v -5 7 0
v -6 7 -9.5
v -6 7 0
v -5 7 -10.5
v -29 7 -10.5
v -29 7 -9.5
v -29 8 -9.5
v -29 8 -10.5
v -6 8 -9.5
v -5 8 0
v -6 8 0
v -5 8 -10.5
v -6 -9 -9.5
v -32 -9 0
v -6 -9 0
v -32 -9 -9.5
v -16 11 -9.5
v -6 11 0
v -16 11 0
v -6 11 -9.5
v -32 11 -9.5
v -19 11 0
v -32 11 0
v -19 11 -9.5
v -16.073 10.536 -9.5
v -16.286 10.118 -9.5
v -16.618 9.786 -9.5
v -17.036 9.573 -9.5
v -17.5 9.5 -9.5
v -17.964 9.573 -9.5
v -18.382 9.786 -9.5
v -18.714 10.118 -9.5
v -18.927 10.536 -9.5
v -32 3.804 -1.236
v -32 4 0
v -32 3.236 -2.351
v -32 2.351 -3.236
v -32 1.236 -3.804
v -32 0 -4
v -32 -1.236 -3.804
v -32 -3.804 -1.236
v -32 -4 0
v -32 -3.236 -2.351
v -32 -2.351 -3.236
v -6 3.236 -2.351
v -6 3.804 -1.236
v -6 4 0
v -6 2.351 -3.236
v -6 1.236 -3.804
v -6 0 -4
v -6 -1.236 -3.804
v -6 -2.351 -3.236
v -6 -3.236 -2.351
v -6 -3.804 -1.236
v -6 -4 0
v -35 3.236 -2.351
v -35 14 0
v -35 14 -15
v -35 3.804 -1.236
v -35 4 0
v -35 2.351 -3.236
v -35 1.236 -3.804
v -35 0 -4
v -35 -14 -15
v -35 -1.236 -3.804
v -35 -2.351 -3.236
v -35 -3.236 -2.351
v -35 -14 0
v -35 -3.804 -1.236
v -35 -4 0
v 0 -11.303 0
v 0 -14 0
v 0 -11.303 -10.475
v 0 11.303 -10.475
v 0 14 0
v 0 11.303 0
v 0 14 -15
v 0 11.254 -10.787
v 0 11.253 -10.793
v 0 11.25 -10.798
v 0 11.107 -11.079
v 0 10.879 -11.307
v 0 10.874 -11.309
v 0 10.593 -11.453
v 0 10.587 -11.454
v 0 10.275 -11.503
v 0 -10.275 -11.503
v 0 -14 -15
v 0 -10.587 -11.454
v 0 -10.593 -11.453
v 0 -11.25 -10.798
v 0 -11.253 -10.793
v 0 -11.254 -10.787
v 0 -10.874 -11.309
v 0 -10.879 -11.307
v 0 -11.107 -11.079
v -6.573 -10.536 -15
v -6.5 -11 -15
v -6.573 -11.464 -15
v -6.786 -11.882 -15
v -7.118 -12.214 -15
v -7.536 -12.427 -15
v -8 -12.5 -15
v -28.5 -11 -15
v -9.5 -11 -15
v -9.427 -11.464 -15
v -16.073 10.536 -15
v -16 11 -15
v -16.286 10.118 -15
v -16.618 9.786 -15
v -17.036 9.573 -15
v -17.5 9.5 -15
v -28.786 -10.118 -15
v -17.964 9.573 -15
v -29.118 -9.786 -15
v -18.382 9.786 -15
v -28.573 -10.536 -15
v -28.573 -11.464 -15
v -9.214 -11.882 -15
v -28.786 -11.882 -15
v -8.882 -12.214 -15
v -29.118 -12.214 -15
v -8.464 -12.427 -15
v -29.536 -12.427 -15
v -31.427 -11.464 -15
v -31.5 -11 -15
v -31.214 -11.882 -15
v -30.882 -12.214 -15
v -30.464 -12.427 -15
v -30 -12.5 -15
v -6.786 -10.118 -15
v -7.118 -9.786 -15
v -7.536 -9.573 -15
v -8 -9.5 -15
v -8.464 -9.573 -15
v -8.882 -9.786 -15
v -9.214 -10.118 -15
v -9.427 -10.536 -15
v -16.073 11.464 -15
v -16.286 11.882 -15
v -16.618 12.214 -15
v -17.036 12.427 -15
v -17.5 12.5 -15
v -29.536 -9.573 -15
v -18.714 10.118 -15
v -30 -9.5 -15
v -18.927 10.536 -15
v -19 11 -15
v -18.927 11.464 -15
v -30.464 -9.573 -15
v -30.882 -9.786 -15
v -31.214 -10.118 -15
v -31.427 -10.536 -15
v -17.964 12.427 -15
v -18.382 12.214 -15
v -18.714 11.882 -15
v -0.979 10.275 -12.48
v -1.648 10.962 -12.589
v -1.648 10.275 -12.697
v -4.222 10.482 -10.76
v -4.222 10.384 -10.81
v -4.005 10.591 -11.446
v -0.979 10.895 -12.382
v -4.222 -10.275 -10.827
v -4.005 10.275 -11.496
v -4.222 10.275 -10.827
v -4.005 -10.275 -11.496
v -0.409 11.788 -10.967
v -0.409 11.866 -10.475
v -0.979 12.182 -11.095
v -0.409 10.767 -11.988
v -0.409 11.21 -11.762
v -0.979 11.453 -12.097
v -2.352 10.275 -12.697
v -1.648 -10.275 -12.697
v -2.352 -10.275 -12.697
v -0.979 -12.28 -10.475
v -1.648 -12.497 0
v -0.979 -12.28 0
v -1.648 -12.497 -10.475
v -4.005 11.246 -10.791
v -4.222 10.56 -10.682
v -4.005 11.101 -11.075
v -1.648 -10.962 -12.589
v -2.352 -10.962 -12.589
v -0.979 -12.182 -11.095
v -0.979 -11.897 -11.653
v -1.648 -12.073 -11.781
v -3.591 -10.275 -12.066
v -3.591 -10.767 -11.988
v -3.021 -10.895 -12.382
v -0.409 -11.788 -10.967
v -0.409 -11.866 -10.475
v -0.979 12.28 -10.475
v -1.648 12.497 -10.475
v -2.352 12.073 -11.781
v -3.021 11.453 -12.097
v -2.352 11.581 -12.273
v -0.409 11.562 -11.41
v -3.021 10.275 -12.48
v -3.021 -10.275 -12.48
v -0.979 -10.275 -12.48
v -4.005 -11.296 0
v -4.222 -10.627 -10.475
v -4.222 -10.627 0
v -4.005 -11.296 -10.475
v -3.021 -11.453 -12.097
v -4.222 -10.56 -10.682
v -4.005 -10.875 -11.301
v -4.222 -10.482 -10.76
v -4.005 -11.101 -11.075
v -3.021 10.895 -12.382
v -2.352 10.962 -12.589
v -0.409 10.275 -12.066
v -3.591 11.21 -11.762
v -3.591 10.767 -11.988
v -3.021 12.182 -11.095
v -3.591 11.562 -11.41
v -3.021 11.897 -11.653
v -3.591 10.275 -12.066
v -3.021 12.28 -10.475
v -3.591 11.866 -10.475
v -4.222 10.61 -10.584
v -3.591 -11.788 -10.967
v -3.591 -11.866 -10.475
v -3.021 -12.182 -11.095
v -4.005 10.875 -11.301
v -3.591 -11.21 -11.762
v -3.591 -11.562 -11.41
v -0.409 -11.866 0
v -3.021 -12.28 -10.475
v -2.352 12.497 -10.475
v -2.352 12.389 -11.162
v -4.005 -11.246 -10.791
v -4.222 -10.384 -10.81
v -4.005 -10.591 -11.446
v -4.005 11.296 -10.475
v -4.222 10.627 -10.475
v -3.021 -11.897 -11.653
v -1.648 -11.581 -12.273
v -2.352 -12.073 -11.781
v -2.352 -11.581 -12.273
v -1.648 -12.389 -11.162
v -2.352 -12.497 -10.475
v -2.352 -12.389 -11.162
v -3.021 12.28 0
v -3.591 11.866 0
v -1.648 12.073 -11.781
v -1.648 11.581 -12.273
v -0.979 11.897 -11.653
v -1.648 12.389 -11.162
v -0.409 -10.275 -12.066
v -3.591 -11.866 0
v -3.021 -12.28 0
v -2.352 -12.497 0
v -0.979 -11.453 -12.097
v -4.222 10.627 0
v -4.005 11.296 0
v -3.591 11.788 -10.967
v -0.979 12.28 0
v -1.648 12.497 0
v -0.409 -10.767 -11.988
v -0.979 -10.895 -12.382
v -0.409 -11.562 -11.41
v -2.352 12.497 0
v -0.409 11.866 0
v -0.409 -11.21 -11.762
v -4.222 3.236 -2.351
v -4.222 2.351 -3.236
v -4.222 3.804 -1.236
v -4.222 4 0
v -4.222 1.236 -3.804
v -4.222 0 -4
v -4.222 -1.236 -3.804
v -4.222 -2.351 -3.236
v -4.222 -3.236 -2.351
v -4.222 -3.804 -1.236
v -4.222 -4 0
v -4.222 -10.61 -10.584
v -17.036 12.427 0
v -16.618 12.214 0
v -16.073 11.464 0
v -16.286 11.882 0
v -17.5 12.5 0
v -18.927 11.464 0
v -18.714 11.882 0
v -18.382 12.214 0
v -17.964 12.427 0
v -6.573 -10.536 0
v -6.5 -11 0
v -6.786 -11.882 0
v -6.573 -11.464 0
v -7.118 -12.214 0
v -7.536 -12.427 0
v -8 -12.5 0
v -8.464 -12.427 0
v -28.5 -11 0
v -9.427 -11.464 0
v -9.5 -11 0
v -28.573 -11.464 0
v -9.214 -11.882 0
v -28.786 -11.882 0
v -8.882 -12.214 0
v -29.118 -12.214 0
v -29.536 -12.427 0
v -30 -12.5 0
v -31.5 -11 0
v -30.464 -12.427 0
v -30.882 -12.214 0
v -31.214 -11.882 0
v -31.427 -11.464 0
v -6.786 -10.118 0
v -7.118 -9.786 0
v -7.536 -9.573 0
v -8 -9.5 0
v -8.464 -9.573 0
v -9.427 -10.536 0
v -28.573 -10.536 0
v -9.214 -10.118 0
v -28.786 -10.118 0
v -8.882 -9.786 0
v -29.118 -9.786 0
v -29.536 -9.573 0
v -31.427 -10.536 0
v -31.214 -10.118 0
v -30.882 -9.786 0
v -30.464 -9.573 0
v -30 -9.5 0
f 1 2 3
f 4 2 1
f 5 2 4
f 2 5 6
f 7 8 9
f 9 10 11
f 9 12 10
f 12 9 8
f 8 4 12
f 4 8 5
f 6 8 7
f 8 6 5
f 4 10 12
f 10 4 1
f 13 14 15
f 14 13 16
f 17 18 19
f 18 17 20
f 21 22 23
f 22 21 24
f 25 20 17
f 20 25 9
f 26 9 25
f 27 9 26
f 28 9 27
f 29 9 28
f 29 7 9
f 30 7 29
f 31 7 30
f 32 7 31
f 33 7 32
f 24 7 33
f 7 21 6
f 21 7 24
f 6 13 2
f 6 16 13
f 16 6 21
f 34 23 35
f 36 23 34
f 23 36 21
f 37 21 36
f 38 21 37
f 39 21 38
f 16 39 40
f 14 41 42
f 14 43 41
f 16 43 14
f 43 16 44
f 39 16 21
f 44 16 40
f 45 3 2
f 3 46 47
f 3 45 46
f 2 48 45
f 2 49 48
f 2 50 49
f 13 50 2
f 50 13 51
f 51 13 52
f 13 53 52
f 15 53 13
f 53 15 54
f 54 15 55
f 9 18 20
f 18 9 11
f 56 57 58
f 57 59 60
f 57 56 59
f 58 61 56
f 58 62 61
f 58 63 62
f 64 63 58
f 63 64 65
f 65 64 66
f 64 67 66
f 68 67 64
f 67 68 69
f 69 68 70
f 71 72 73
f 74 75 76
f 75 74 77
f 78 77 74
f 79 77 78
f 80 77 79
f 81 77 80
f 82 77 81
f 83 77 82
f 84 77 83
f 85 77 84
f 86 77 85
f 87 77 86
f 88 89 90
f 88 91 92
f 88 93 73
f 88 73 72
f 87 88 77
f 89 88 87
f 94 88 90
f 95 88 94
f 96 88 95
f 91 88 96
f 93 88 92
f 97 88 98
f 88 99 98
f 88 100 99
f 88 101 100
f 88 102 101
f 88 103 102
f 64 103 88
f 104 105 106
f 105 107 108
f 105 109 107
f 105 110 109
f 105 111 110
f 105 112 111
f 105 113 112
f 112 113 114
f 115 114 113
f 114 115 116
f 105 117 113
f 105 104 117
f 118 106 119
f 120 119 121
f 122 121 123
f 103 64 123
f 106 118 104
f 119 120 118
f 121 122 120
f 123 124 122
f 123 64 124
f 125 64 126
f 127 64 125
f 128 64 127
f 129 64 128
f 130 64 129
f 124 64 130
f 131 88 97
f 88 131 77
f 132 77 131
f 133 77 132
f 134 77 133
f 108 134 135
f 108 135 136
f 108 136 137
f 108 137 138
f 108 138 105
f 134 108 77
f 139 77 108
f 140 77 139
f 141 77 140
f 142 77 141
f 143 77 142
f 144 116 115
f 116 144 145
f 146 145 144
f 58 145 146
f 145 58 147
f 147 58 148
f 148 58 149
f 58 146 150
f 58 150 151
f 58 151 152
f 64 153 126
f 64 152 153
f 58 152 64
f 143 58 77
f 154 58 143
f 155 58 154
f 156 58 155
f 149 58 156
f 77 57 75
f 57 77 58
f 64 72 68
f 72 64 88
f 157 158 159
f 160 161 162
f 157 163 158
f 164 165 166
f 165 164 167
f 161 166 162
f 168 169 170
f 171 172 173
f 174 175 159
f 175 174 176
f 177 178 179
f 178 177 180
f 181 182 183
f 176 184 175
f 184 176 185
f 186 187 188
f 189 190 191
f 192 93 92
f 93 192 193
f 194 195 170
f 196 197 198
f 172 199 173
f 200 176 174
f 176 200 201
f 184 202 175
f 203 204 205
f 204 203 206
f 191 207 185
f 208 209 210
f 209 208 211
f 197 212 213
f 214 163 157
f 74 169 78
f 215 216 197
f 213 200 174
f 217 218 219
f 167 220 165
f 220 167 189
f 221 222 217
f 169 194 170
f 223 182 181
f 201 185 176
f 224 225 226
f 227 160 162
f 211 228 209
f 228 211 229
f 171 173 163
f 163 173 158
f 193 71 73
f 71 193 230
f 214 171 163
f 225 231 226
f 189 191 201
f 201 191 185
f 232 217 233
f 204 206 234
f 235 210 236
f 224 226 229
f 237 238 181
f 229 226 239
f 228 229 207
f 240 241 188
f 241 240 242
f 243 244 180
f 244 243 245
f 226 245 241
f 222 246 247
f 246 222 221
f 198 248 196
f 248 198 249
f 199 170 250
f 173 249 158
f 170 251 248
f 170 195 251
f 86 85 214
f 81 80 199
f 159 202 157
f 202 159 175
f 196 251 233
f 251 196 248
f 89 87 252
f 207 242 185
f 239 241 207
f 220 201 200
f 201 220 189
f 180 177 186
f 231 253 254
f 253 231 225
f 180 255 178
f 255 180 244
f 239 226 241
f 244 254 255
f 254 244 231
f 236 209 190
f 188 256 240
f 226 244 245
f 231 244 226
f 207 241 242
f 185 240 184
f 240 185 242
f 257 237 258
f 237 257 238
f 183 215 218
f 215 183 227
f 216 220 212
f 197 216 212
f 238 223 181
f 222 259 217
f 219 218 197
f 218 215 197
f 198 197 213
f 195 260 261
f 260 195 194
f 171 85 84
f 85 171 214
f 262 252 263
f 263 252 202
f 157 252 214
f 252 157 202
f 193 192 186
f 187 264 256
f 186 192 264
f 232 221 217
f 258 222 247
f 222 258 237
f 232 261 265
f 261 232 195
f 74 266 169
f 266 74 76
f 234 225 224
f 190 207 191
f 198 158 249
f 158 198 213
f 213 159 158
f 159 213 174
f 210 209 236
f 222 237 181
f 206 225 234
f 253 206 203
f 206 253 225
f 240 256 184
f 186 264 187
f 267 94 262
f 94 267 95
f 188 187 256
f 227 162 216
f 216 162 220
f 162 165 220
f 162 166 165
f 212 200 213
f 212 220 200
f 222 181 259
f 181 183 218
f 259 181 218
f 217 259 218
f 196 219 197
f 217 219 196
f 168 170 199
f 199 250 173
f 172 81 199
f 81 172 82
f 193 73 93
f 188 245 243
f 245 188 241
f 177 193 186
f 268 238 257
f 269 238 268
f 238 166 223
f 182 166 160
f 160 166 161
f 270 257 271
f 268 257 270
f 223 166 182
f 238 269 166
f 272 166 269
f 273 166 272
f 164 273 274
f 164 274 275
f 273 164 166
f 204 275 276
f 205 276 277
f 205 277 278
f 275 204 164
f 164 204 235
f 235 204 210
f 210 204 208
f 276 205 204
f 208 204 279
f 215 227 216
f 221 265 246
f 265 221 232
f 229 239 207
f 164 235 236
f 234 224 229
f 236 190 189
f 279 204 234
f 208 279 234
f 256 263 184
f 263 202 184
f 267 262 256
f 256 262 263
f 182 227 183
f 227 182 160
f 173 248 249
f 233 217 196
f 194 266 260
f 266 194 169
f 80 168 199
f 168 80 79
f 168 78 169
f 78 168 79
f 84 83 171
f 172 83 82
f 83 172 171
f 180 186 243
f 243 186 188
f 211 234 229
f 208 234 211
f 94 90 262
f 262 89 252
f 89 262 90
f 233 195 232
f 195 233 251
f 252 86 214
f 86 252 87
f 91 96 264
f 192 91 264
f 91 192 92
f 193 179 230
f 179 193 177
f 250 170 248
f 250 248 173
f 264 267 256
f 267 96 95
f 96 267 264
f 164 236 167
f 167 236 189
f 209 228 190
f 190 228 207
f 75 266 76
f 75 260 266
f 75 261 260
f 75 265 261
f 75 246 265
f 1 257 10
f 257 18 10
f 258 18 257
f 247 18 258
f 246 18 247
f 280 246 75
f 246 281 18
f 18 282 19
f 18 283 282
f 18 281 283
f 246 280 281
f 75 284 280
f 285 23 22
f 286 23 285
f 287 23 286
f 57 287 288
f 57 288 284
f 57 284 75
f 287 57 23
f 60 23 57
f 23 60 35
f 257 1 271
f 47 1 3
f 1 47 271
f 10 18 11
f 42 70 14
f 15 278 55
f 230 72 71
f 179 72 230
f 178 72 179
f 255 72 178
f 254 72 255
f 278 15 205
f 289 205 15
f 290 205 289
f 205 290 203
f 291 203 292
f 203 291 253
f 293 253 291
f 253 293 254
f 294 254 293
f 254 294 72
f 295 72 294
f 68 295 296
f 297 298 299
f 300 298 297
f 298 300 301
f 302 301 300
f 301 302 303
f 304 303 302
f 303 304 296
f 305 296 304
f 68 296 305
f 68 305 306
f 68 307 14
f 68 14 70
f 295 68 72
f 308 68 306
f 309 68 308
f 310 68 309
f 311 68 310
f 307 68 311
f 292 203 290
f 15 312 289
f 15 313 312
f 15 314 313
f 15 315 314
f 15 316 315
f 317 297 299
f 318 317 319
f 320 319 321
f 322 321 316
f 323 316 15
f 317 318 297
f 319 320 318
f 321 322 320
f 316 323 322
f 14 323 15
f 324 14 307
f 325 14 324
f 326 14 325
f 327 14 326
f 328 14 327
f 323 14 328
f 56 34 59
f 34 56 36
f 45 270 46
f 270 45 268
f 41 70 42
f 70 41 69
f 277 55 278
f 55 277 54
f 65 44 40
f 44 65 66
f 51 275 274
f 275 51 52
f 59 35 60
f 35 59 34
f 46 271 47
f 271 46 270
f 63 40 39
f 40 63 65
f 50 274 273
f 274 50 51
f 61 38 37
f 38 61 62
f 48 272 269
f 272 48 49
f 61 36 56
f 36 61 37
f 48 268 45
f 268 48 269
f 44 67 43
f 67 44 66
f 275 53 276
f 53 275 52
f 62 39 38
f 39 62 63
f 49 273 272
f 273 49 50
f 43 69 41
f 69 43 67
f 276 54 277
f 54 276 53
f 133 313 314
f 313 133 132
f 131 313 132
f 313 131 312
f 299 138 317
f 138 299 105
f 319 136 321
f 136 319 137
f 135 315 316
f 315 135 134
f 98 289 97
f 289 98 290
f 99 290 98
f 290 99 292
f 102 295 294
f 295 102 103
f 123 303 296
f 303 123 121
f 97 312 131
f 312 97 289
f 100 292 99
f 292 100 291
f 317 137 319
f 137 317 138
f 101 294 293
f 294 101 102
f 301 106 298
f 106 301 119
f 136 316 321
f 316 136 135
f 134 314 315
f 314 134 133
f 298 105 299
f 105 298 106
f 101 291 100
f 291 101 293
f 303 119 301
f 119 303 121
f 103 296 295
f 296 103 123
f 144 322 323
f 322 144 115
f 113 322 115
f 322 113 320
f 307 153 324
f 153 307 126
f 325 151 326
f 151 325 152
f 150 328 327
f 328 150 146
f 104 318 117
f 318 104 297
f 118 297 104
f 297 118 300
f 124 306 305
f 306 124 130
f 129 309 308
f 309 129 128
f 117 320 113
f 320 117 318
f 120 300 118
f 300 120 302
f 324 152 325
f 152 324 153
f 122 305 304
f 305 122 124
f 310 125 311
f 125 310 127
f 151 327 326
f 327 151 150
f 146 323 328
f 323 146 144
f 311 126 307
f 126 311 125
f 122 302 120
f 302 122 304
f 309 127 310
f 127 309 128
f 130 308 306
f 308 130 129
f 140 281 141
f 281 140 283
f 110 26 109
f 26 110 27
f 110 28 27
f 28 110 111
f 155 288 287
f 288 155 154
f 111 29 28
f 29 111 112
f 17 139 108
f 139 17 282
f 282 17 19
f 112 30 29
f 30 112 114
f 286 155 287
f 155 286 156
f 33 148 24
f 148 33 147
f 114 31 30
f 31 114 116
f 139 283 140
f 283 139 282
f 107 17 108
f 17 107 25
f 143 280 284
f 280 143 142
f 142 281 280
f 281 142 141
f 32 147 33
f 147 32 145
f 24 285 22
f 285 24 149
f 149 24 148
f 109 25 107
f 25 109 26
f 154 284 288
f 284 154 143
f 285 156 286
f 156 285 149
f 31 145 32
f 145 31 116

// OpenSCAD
$fn=20;
module connectorPlate(){
    
    radius = 2.25;
    offset_x = (23.2-radius)/2; 
    offset_y = (22.8-radius) /2; 
    hull() for(i = [-1,1]) for (j=[-1,1]) {
        translate([i*offset_x,j*offset_y,2]) sphere(r=2.25);
    }
}
module circuitPlate(){
    translate([-10.5,0,0]) cube([21,24,1]);
    translate([-9.5,1,-3]) cube([19,26,20]);
    
    }
    
rotate([0,-90,0]) difference() {
    translate([-15,-14,0]) cube([30,28,35]);
    hull(){    
        connectorPlate();
    }
    translate([0,8,5]) rotate([90,0,0]) circuitPlate();
    translate([0,-50,-1]) cube([100,100,100]);
    cylinder(r=4,h=40);
    translate([0,-11,8])
        rotate([0,90,0])cylinder(r=1.5,h=40,center=true);
    translate([0,-11,30])
        rotate([0,90,0])cylinder(r=1.5,h=40,center=true);
    translate([0,11,17.5])
        rotate([0,90,0])cylinder(r=1.5,h=40,center=true);
}    
    
